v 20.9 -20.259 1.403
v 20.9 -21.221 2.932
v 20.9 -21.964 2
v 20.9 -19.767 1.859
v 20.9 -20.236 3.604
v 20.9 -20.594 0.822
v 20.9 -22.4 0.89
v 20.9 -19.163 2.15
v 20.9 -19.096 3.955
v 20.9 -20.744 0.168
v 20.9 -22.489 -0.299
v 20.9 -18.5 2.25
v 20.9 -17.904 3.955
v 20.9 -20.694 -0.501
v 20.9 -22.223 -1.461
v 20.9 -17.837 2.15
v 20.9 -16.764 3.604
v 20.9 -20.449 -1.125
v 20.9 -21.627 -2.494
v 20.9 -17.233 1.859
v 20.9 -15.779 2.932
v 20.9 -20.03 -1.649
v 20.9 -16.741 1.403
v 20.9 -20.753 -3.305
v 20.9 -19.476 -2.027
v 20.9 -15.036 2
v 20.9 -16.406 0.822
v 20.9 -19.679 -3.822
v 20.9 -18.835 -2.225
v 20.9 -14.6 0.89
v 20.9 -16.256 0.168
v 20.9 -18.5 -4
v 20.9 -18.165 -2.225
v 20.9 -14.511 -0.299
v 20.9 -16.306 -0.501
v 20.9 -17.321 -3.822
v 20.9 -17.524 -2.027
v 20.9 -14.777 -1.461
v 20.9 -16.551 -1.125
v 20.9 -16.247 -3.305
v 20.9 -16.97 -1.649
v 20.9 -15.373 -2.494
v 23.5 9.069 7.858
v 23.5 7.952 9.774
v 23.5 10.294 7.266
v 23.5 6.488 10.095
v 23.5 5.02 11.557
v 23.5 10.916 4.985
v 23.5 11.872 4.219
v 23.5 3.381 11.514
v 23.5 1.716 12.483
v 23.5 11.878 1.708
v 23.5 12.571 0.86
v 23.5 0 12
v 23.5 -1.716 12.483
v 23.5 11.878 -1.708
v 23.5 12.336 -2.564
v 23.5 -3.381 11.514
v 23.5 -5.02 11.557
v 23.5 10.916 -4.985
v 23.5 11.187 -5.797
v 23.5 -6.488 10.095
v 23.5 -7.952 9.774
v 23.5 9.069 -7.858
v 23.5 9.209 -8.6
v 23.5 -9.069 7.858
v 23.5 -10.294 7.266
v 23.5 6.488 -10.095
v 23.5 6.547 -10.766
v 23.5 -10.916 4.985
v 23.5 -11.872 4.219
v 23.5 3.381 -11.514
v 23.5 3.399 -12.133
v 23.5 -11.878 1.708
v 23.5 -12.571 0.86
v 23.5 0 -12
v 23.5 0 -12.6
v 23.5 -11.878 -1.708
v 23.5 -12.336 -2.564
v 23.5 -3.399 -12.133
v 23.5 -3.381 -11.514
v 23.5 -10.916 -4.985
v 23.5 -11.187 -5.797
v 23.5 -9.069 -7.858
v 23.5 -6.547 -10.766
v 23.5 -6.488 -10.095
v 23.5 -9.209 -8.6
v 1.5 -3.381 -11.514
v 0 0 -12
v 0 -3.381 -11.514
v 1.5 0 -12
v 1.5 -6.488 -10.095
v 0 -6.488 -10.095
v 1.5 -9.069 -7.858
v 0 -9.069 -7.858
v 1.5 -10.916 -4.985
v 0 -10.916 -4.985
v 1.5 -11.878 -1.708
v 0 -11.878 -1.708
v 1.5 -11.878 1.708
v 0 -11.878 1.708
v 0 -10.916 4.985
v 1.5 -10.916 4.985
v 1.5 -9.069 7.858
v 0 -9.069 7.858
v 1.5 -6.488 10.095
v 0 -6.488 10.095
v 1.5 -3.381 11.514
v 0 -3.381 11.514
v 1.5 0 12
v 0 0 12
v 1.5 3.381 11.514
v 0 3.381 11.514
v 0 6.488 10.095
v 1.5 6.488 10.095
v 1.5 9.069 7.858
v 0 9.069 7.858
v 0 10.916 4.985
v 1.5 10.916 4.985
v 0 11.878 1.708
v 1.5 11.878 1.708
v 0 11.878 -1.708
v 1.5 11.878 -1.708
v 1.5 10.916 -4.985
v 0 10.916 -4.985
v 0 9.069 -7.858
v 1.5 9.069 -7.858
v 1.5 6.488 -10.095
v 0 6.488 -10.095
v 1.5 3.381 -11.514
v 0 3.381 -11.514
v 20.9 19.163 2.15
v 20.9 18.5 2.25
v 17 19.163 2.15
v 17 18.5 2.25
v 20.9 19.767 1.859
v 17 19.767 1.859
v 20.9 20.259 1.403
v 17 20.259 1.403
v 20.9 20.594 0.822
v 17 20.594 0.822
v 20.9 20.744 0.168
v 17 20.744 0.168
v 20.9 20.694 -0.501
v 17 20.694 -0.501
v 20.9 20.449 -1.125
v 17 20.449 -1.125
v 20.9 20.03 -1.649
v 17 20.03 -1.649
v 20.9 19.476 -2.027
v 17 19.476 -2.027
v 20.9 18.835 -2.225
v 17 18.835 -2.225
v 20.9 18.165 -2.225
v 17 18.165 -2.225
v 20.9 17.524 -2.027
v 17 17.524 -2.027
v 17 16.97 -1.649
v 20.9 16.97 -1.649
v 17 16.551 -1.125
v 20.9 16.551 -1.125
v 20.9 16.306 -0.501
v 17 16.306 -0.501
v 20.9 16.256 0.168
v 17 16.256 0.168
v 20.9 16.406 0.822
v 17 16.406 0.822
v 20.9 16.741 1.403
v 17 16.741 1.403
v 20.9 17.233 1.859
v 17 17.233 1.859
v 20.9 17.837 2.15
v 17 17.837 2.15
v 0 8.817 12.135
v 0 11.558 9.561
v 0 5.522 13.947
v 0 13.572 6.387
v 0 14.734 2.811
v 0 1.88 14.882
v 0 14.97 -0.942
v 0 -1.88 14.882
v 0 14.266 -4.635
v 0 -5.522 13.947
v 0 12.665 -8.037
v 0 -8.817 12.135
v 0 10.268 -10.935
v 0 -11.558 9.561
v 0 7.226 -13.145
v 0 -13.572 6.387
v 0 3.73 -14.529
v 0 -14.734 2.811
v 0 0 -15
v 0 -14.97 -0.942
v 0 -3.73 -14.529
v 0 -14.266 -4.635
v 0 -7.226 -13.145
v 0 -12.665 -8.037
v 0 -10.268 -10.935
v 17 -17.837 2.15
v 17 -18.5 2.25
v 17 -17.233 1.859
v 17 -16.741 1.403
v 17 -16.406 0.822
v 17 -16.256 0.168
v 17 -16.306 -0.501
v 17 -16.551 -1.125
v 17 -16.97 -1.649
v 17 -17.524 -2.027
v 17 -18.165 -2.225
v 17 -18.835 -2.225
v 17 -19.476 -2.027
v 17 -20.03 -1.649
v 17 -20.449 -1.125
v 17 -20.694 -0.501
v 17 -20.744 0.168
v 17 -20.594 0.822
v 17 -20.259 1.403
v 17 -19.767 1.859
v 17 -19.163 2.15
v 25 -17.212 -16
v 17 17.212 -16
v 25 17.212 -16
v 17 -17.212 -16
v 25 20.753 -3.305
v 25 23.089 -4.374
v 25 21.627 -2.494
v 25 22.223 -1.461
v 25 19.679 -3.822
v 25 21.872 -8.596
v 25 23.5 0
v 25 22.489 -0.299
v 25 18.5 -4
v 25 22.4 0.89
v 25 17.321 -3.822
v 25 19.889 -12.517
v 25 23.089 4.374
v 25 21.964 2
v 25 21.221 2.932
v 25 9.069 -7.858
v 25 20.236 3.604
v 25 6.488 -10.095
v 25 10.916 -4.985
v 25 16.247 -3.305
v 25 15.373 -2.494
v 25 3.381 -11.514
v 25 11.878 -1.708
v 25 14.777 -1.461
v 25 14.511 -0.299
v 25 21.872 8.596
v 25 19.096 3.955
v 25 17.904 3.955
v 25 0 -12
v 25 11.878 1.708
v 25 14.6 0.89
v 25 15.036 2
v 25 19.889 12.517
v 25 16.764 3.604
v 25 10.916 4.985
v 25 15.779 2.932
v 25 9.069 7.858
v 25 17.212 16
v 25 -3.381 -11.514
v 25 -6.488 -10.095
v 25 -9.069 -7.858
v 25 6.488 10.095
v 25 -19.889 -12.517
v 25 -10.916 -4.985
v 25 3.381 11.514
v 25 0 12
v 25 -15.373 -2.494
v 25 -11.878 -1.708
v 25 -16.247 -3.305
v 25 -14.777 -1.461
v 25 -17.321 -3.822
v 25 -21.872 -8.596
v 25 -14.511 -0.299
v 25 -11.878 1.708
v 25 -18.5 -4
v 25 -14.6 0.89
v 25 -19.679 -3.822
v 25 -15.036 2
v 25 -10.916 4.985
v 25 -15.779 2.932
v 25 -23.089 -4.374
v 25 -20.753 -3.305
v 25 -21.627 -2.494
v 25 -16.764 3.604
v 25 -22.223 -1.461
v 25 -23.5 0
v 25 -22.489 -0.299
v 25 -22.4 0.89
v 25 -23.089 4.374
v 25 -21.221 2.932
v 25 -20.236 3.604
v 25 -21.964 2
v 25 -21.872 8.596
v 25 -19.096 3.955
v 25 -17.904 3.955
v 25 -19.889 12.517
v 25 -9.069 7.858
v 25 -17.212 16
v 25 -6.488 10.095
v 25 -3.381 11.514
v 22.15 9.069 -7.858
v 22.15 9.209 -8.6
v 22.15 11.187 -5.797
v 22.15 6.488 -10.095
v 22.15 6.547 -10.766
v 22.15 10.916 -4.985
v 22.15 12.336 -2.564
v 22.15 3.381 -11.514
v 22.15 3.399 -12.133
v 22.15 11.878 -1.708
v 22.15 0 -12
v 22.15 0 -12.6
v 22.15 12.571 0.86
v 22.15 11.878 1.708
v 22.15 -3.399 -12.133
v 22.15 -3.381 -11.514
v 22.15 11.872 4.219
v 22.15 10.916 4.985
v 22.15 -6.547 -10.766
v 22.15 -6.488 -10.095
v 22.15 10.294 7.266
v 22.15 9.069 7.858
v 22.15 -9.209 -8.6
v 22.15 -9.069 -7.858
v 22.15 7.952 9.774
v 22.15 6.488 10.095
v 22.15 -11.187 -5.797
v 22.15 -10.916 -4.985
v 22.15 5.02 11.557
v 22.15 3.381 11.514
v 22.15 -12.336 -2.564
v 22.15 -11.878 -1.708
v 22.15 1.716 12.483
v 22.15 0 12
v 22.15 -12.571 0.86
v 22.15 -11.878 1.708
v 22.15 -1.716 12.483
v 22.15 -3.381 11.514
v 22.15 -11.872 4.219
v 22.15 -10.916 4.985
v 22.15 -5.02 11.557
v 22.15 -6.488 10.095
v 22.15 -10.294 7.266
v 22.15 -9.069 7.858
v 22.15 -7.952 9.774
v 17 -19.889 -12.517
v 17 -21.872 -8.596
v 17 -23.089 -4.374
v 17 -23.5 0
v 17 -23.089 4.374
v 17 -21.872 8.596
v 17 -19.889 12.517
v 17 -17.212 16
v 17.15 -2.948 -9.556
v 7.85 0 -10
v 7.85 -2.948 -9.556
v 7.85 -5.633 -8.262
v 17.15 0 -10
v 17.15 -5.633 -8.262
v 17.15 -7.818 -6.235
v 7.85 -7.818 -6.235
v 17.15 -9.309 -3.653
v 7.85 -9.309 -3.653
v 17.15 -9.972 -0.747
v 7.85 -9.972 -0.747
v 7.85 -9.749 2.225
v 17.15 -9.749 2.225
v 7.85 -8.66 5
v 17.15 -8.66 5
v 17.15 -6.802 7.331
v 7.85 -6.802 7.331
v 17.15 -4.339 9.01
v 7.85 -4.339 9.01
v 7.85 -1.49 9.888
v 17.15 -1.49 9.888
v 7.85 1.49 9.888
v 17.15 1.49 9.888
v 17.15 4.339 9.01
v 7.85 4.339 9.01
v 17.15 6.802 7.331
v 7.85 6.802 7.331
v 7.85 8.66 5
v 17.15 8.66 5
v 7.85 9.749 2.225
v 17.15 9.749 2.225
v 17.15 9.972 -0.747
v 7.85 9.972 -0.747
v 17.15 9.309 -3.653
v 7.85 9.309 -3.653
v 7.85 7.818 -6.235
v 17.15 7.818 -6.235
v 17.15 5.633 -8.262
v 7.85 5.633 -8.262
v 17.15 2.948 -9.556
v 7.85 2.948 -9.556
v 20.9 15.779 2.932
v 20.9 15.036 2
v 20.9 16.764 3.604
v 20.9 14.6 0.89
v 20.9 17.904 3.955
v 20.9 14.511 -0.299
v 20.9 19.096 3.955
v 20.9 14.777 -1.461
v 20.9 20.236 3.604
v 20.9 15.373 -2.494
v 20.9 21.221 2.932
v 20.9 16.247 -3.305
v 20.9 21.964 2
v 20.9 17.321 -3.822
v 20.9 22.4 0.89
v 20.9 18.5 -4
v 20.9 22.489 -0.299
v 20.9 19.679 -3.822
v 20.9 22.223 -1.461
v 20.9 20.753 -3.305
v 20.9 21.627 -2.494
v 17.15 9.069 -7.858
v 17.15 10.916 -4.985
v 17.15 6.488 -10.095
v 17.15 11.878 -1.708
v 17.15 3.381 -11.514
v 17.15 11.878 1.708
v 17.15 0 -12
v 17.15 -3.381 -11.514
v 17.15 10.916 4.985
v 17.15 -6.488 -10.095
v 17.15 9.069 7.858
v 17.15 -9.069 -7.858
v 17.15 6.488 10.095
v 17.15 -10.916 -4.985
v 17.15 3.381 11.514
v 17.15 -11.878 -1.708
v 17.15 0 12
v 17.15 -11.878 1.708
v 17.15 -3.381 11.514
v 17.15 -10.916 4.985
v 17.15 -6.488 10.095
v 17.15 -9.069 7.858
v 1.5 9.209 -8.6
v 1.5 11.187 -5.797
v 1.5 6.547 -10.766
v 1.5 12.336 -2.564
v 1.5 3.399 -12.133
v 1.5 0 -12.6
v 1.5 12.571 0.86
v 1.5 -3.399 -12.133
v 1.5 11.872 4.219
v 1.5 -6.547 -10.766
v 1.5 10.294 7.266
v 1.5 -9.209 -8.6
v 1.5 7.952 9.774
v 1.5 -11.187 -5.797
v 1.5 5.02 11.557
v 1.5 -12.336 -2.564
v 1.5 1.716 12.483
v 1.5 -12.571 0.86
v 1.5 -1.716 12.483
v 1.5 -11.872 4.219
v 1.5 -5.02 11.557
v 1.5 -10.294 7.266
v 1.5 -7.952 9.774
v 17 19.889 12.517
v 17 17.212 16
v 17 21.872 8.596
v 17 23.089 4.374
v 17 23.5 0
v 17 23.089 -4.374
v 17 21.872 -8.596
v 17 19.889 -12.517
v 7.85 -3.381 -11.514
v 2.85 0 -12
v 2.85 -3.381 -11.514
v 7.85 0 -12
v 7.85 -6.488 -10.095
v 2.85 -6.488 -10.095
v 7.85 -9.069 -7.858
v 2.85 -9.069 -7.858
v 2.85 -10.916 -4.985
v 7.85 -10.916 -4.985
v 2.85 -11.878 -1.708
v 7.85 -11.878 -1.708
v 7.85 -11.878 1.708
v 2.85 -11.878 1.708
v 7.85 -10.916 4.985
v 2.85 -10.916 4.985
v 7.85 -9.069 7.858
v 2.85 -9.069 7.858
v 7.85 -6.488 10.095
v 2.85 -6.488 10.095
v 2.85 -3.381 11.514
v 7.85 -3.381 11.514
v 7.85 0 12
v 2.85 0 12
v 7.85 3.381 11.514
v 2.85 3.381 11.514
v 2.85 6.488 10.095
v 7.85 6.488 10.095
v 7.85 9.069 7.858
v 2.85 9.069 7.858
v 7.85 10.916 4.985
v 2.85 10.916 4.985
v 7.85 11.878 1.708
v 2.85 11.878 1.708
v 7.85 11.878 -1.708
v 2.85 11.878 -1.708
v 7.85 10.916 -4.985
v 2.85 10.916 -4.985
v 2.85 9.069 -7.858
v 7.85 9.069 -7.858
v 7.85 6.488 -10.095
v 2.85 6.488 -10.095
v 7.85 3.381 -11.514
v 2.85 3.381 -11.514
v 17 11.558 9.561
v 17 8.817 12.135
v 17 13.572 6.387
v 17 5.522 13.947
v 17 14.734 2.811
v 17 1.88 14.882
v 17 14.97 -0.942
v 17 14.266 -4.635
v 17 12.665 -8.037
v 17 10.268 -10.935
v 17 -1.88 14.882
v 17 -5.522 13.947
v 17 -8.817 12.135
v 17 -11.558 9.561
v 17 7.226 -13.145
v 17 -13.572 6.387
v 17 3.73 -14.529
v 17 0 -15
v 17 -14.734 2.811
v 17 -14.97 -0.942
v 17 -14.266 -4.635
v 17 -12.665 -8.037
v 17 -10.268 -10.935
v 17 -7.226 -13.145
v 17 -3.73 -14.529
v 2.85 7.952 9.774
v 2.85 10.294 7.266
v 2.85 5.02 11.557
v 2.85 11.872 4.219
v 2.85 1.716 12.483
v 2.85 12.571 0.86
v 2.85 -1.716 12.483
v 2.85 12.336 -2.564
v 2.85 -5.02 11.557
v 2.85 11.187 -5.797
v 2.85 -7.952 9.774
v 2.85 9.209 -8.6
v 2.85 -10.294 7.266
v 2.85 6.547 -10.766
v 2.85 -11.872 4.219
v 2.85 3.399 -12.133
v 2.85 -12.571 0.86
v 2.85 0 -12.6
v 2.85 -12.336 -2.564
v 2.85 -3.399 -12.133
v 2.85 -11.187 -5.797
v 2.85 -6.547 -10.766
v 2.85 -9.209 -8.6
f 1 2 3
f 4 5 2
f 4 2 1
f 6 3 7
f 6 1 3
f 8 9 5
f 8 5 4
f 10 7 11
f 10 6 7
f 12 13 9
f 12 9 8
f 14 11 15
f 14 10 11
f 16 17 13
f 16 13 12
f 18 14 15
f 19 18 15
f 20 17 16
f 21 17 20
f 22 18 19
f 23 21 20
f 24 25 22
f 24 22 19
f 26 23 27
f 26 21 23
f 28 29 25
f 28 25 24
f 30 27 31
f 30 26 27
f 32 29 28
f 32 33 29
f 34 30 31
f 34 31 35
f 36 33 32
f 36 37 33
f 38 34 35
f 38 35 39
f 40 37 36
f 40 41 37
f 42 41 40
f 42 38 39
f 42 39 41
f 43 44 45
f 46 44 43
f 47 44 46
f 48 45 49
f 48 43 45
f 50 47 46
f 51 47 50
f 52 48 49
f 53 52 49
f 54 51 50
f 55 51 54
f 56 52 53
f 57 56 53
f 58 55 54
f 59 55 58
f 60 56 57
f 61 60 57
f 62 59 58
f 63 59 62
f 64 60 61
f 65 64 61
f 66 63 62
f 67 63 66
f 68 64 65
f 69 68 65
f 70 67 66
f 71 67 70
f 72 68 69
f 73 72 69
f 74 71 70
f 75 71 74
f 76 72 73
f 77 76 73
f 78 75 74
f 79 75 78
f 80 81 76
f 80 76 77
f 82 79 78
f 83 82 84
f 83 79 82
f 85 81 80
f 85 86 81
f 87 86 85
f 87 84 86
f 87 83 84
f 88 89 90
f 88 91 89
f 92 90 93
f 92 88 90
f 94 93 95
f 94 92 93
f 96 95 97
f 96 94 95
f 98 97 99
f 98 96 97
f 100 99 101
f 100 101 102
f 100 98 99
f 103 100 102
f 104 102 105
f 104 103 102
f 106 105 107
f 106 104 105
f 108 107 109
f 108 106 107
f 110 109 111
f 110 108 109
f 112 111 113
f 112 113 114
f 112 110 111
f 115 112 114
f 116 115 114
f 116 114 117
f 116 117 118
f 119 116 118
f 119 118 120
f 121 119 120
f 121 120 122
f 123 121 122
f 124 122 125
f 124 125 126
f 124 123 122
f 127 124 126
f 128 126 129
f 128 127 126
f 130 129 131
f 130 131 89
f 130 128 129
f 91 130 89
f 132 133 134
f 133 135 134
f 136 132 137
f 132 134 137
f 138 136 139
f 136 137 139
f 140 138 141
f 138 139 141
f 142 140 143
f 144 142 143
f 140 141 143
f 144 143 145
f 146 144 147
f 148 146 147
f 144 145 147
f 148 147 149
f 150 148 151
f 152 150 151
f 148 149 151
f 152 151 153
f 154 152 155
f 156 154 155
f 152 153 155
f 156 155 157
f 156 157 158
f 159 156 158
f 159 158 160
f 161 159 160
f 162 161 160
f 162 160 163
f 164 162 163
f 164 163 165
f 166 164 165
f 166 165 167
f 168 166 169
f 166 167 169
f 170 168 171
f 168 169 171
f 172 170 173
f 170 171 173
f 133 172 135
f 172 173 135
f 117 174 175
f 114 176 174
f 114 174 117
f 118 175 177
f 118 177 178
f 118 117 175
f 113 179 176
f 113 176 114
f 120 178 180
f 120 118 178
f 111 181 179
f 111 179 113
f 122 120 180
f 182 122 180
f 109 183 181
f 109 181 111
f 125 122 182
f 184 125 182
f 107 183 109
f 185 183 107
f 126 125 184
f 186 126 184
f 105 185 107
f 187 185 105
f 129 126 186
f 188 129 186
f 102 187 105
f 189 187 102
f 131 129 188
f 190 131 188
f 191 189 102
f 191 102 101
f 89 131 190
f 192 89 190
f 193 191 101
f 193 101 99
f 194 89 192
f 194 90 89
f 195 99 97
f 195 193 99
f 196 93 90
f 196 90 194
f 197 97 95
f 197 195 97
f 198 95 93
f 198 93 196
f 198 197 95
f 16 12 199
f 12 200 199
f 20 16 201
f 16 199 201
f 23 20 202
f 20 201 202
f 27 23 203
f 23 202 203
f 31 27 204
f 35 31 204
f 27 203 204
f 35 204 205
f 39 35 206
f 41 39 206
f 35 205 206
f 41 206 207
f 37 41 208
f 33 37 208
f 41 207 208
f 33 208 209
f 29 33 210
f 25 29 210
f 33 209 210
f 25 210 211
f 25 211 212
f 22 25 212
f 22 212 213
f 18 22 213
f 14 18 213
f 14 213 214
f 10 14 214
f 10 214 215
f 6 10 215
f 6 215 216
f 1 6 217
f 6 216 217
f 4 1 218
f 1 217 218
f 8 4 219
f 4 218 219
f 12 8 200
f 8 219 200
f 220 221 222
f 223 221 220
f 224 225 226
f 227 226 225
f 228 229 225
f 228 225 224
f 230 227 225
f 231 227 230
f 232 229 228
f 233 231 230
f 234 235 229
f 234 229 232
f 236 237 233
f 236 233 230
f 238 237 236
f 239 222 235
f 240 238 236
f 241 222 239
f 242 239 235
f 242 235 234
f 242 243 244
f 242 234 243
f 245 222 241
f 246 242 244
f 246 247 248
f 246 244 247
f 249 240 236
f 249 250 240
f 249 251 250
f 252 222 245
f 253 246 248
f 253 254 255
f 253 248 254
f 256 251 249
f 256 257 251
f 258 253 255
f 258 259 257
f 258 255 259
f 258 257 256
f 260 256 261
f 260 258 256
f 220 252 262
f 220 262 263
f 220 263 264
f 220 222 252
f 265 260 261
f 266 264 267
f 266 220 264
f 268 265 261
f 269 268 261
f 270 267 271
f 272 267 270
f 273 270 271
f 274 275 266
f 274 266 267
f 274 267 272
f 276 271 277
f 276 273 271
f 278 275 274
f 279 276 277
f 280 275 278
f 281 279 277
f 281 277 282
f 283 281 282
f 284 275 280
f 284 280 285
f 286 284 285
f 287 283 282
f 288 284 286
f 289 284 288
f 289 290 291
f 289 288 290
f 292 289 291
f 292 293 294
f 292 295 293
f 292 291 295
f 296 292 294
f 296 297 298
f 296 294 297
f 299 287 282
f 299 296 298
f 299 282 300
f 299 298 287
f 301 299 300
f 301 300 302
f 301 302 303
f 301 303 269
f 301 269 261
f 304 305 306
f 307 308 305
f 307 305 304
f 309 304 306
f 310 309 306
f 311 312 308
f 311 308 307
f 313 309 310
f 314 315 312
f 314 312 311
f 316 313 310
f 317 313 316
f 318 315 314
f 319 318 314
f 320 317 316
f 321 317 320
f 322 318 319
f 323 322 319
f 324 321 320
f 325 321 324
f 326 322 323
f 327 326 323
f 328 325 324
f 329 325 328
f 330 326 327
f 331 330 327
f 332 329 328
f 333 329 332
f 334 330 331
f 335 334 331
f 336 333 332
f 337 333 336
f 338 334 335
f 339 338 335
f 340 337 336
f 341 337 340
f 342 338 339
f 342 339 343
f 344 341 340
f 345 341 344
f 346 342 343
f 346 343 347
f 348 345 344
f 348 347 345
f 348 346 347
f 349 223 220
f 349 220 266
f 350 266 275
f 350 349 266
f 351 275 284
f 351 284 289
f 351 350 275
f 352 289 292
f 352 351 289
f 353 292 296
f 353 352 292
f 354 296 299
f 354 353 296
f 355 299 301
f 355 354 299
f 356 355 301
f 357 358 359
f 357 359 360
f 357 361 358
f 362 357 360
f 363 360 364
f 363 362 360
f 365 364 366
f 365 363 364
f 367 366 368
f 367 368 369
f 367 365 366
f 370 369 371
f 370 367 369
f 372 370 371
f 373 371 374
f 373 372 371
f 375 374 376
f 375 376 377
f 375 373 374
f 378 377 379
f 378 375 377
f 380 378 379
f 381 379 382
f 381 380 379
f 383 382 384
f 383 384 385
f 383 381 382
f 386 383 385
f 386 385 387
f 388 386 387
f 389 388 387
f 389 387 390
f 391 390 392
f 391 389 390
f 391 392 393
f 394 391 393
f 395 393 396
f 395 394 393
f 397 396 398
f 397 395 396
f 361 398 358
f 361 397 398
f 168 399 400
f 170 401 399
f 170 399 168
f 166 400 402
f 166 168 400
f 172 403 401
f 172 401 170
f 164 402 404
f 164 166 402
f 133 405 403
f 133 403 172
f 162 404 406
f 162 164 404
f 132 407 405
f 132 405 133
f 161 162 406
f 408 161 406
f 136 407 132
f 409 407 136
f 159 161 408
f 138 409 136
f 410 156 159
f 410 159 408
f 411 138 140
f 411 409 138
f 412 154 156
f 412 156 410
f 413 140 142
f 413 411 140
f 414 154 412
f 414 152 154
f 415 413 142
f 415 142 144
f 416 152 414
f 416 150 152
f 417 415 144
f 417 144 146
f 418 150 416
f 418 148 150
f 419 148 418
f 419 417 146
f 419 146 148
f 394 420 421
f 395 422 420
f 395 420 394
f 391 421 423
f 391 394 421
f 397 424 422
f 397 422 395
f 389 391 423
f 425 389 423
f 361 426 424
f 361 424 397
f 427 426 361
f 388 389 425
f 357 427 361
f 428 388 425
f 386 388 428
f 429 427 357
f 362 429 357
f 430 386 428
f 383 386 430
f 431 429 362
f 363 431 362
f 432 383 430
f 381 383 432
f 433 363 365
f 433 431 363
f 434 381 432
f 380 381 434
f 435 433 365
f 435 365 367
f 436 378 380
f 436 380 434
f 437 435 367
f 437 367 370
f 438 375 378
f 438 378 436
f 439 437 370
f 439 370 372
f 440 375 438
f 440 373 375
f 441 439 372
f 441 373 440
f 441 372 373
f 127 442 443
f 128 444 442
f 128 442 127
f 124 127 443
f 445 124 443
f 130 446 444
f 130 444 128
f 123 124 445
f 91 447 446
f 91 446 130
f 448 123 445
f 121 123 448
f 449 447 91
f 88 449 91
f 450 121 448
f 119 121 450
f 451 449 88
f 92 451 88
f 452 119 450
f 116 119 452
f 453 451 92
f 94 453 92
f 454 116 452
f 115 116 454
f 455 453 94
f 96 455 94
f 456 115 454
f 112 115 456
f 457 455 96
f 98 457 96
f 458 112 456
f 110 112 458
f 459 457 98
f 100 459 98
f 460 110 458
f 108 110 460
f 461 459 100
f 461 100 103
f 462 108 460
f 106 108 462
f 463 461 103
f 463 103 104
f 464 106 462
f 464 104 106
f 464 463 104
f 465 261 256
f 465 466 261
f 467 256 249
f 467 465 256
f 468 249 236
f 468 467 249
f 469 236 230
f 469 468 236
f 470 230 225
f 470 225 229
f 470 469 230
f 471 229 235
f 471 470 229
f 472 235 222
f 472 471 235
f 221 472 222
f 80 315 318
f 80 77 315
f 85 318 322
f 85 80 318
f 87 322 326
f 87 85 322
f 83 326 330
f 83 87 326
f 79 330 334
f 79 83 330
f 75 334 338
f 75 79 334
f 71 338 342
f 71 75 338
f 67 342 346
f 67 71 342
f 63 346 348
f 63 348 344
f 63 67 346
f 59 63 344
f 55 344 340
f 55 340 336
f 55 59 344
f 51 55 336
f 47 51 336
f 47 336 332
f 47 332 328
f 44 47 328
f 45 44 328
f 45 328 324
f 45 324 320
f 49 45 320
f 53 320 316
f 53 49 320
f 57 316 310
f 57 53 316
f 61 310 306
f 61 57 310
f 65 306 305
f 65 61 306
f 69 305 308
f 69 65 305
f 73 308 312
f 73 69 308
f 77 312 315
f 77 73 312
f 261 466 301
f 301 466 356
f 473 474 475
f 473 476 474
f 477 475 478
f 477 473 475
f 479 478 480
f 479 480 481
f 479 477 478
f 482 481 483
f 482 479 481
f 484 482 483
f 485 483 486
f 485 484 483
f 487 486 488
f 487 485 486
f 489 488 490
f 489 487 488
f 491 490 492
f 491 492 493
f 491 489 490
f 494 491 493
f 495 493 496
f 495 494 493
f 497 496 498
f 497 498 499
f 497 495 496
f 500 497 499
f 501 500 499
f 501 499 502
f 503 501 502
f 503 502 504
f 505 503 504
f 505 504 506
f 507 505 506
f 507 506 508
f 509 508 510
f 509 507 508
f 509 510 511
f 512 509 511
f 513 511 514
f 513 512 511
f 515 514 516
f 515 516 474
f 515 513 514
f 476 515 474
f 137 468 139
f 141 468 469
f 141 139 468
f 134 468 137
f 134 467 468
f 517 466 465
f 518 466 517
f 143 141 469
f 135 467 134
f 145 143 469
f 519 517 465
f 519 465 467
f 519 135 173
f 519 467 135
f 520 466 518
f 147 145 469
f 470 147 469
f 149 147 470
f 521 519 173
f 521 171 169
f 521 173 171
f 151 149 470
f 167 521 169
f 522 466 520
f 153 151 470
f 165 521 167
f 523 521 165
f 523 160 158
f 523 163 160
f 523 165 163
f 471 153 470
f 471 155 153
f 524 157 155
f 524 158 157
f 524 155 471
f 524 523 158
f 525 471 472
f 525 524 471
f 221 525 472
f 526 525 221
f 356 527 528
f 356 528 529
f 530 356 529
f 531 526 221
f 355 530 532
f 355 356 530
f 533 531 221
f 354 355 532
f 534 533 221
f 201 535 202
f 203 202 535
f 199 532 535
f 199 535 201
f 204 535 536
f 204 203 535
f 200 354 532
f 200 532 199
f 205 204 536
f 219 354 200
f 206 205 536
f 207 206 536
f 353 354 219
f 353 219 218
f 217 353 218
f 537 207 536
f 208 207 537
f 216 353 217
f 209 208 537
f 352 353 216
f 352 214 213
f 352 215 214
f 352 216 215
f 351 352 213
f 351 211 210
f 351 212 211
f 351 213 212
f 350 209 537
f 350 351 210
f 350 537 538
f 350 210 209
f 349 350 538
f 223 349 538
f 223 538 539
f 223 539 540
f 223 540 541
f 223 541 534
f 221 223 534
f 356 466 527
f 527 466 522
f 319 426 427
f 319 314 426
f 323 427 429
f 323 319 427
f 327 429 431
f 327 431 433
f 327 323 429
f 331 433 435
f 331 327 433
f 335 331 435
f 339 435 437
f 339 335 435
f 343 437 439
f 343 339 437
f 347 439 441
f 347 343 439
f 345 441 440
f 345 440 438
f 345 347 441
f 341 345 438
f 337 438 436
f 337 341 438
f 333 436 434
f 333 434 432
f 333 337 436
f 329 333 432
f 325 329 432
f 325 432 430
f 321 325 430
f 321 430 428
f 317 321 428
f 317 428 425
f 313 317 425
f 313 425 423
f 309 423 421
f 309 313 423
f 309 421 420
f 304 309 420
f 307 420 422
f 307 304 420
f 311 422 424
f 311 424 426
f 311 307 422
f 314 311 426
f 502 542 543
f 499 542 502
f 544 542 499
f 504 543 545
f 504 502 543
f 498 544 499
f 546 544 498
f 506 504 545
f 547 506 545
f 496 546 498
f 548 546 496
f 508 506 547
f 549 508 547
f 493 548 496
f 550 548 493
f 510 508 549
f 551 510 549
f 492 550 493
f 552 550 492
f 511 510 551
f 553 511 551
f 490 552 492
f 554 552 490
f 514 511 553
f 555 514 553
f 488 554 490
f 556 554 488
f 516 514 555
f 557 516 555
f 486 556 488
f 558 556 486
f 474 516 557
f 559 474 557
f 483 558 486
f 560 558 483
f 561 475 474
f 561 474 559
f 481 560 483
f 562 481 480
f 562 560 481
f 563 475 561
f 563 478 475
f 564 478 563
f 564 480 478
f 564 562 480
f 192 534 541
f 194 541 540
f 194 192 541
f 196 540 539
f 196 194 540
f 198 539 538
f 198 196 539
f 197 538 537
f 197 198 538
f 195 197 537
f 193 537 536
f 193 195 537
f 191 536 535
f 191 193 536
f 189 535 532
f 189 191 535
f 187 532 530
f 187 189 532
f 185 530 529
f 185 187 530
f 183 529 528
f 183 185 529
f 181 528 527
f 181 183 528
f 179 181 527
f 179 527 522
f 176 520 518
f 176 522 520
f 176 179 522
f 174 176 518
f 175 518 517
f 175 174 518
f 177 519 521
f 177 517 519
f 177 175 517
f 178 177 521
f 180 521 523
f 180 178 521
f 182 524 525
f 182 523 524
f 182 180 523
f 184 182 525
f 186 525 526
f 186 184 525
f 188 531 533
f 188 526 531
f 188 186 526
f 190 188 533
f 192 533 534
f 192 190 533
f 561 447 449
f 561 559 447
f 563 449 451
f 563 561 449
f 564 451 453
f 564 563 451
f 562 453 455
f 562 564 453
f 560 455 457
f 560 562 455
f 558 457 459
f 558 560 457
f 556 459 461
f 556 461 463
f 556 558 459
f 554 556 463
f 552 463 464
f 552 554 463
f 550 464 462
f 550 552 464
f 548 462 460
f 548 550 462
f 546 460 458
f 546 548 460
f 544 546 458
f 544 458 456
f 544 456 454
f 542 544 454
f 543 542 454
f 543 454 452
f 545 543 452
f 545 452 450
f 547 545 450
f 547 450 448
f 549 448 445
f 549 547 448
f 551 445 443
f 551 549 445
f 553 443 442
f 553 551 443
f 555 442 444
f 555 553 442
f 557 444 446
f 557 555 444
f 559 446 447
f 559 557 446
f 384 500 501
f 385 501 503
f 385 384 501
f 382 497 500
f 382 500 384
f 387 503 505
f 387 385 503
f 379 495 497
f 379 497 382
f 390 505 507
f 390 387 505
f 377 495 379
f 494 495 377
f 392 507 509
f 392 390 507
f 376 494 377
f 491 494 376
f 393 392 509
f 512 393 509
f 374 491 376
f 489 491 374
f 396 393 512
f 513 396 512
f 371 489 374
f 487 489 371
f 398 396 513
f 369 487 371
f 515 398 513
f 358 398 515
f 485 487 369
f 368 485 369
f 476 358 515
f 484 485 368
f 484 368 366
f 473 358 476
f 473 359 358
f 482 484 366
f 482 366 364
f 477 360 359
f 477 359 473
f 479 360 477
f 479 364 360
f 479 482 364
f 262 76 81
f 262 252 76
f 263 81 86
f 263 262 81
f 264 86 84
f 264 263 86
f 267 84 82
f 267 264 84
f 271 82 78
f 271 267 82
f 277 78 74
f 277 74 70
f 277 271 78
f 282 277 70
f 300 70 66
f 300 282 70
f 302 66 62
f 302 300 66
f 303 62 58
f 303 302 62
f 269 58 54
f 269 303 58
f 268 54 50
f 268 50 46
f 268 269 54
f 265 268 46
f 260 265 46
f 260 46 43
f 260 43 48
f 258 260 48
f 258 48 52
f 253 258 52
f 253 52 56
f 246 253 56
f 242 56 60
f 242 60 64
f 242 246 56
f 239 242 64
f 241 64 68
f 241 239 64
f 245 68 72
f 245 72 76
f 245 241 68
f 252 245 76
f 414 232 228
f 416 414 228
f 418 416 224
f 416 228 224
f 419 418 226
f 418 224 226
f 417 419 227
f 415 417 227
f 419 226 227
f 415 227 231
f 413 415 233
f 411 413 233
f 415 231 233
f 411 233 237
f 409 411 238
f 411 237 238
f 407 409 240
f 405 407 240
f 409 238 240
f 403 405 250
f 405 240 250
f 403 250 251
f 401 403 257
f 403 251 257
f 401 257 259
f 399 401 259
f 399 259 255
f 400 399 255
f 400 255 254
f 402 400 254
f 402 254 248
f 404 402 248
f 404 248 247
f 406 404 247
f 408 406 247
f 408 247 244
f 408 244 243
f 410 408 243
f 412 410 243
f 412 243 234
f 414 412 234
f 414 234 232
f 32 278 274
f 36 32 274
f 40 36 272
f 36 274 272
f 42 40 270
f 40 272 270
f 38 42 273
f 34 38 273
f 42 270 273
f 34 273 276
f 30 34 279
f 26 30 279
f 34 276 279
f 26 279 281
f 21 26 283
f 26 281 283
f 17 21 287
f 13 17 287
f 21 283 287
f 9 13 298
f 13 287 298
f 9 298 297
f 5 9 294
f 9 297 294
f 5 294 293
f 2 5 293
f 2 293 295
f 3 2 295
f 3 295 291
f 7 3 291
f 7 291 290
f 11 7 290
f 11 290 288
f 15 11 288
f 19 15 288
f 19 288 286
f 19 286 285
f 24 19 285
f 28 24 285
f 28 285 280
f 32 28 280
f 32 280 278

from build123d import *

# Parameters (mm, degrees)
CBORE_SOCKET_HEAD_CAP_SCREW1_D           = 4.5
CBORE_SOCKET_HEAD_CAP_SCREW1_CBORE_D     = 8
CBORE_SOCKET_HEAD_CAP_SCREW1_CBORE_DEPTH = 4.1
DELETEFACE1_START                        = 17
DELETEFACE1_OUTLINE_R                    = 4
DELETEFACE1_DEPTH                        = 8
CUT_EXTRUDE2_DEPTH                       = 38.32961291
CBORE_SOCKET_HEAD_CAP_SCREW2_D           = 4.5
CBORE_SOCKET_HEAD_CAP_SCREW2_CBORE_D     = 8
CBORE_SOCKET_HEAD_CAP_SCREW2_CBORE_DEPTH = 4.1


# Read off the part's stored shape, not the designer's step: DeleteFace1
with BuildPart() as part:
    # Sketch1 → Revolve1 (revolve)
    with BuildSketch(Plane.XY, mode=Mode.PRIVATE) as revolve1_sk:
        Polygon((25, 12), (25, 23.5), (17, 23.5), (17, 15), (0, 15), (0, 12), (1.5, 12), (1.5, 12.6), (2.85, 12.6), (2.85, 12), (7.85, 12), (7.85, 10), (17.15, 10), (17.15, 12), (22.15, 12), (22.15, 12.6), (23.5, 12.6), (23.5, 12), align=None)
    revolve(revolve1_sk.sketch.rotate(Axis((25, 0, 0), (-1, 0, 0)), 90), axis=Axis((25, 0, 0), (-1, 0, 0)))

    # CBORE Socket Head Cap Screw1 (through all)
    with Locations(Plane(origin=(25, 0, 0), x_dir=(0, 0, -1), z_dir=(1, 0, 0))):
        with Locations((0, 18.5), (18.5, 0), (-18.5, 0), (0, -18.5)):
            CounterBoreHole(CBORE_SOCKET_HEAD_CAP_SCREW1_D / 2, CBORE_SOCKET_HEAD_CAP_SCREW1_CBORE_D / 2, CBORE_SOCKET_HEAD_CAP_SCREW1_CBORE_DEPTH)

    # DeleteFace1 outline → DeleteFace1 (add)
    with BuildSketch(Plane.YZ.offset(DELETEFACE1_START)):
        with Locations((-18.5, 0)):
            Circle(DELETEFACE1_OUTLINE_R)
        with Locations((0, 18.5)):
            Circle(DELETEFACE1_OUTLINE_R)
        with Locations((0, -18.5)):
            Circle(DELETEFACE1_OUTLINE_R)
        with Locations((18.5, 0)):
            Circle(DELETEFACE1_OUTLINE_R)
    extrude(amount=DELETEFACE1_DEPTH)

    # Sketch5 → Cut-Extrude2 (cut, through all)
    with BuildSketch(Plane(origin=(17, 0, 0), x_dir=(0, 0, -1), z_dir=(1, 0, 0))):
        with BuildLine():
            Line((-16, 17.211914478), (-16, -17.211914478))
            ThreePointArc((-16, -17.211914478), (-23.5, 0), (-16, 17.211914478))
        make_face()
        with BuildLine():
            Line((16, 17.211914478), (16, -17.211914478))
            ThreePointArc((16, -17.211914478), (23.5, 0), (16, 17.211914478))
        make_face()
    extrude(amount=CUT_EXTRUDE2_DEPTH, mode=Mode.SUBTRACT)

    # CBORE Socket Head Cap Screw2 (through all)
    with Locations(Plane(origin=(25, 0, 0), x_dir=(0, 0, -1), z_dir=(1, 0, 0))):
        with Locations((0, 18.5), (0, -18.5)):
            CounterBoreHole(CBORE_SOCKET_HEAD_CAP_SCREW2_D / 2, CBORE_SOCKET_HEAD_CAP_SCREW2_CBORE_D / 2, CBORE_SOCKET_HEAD_CAP_SCREW2_CBORE_DEPTH)


solid = part.part
